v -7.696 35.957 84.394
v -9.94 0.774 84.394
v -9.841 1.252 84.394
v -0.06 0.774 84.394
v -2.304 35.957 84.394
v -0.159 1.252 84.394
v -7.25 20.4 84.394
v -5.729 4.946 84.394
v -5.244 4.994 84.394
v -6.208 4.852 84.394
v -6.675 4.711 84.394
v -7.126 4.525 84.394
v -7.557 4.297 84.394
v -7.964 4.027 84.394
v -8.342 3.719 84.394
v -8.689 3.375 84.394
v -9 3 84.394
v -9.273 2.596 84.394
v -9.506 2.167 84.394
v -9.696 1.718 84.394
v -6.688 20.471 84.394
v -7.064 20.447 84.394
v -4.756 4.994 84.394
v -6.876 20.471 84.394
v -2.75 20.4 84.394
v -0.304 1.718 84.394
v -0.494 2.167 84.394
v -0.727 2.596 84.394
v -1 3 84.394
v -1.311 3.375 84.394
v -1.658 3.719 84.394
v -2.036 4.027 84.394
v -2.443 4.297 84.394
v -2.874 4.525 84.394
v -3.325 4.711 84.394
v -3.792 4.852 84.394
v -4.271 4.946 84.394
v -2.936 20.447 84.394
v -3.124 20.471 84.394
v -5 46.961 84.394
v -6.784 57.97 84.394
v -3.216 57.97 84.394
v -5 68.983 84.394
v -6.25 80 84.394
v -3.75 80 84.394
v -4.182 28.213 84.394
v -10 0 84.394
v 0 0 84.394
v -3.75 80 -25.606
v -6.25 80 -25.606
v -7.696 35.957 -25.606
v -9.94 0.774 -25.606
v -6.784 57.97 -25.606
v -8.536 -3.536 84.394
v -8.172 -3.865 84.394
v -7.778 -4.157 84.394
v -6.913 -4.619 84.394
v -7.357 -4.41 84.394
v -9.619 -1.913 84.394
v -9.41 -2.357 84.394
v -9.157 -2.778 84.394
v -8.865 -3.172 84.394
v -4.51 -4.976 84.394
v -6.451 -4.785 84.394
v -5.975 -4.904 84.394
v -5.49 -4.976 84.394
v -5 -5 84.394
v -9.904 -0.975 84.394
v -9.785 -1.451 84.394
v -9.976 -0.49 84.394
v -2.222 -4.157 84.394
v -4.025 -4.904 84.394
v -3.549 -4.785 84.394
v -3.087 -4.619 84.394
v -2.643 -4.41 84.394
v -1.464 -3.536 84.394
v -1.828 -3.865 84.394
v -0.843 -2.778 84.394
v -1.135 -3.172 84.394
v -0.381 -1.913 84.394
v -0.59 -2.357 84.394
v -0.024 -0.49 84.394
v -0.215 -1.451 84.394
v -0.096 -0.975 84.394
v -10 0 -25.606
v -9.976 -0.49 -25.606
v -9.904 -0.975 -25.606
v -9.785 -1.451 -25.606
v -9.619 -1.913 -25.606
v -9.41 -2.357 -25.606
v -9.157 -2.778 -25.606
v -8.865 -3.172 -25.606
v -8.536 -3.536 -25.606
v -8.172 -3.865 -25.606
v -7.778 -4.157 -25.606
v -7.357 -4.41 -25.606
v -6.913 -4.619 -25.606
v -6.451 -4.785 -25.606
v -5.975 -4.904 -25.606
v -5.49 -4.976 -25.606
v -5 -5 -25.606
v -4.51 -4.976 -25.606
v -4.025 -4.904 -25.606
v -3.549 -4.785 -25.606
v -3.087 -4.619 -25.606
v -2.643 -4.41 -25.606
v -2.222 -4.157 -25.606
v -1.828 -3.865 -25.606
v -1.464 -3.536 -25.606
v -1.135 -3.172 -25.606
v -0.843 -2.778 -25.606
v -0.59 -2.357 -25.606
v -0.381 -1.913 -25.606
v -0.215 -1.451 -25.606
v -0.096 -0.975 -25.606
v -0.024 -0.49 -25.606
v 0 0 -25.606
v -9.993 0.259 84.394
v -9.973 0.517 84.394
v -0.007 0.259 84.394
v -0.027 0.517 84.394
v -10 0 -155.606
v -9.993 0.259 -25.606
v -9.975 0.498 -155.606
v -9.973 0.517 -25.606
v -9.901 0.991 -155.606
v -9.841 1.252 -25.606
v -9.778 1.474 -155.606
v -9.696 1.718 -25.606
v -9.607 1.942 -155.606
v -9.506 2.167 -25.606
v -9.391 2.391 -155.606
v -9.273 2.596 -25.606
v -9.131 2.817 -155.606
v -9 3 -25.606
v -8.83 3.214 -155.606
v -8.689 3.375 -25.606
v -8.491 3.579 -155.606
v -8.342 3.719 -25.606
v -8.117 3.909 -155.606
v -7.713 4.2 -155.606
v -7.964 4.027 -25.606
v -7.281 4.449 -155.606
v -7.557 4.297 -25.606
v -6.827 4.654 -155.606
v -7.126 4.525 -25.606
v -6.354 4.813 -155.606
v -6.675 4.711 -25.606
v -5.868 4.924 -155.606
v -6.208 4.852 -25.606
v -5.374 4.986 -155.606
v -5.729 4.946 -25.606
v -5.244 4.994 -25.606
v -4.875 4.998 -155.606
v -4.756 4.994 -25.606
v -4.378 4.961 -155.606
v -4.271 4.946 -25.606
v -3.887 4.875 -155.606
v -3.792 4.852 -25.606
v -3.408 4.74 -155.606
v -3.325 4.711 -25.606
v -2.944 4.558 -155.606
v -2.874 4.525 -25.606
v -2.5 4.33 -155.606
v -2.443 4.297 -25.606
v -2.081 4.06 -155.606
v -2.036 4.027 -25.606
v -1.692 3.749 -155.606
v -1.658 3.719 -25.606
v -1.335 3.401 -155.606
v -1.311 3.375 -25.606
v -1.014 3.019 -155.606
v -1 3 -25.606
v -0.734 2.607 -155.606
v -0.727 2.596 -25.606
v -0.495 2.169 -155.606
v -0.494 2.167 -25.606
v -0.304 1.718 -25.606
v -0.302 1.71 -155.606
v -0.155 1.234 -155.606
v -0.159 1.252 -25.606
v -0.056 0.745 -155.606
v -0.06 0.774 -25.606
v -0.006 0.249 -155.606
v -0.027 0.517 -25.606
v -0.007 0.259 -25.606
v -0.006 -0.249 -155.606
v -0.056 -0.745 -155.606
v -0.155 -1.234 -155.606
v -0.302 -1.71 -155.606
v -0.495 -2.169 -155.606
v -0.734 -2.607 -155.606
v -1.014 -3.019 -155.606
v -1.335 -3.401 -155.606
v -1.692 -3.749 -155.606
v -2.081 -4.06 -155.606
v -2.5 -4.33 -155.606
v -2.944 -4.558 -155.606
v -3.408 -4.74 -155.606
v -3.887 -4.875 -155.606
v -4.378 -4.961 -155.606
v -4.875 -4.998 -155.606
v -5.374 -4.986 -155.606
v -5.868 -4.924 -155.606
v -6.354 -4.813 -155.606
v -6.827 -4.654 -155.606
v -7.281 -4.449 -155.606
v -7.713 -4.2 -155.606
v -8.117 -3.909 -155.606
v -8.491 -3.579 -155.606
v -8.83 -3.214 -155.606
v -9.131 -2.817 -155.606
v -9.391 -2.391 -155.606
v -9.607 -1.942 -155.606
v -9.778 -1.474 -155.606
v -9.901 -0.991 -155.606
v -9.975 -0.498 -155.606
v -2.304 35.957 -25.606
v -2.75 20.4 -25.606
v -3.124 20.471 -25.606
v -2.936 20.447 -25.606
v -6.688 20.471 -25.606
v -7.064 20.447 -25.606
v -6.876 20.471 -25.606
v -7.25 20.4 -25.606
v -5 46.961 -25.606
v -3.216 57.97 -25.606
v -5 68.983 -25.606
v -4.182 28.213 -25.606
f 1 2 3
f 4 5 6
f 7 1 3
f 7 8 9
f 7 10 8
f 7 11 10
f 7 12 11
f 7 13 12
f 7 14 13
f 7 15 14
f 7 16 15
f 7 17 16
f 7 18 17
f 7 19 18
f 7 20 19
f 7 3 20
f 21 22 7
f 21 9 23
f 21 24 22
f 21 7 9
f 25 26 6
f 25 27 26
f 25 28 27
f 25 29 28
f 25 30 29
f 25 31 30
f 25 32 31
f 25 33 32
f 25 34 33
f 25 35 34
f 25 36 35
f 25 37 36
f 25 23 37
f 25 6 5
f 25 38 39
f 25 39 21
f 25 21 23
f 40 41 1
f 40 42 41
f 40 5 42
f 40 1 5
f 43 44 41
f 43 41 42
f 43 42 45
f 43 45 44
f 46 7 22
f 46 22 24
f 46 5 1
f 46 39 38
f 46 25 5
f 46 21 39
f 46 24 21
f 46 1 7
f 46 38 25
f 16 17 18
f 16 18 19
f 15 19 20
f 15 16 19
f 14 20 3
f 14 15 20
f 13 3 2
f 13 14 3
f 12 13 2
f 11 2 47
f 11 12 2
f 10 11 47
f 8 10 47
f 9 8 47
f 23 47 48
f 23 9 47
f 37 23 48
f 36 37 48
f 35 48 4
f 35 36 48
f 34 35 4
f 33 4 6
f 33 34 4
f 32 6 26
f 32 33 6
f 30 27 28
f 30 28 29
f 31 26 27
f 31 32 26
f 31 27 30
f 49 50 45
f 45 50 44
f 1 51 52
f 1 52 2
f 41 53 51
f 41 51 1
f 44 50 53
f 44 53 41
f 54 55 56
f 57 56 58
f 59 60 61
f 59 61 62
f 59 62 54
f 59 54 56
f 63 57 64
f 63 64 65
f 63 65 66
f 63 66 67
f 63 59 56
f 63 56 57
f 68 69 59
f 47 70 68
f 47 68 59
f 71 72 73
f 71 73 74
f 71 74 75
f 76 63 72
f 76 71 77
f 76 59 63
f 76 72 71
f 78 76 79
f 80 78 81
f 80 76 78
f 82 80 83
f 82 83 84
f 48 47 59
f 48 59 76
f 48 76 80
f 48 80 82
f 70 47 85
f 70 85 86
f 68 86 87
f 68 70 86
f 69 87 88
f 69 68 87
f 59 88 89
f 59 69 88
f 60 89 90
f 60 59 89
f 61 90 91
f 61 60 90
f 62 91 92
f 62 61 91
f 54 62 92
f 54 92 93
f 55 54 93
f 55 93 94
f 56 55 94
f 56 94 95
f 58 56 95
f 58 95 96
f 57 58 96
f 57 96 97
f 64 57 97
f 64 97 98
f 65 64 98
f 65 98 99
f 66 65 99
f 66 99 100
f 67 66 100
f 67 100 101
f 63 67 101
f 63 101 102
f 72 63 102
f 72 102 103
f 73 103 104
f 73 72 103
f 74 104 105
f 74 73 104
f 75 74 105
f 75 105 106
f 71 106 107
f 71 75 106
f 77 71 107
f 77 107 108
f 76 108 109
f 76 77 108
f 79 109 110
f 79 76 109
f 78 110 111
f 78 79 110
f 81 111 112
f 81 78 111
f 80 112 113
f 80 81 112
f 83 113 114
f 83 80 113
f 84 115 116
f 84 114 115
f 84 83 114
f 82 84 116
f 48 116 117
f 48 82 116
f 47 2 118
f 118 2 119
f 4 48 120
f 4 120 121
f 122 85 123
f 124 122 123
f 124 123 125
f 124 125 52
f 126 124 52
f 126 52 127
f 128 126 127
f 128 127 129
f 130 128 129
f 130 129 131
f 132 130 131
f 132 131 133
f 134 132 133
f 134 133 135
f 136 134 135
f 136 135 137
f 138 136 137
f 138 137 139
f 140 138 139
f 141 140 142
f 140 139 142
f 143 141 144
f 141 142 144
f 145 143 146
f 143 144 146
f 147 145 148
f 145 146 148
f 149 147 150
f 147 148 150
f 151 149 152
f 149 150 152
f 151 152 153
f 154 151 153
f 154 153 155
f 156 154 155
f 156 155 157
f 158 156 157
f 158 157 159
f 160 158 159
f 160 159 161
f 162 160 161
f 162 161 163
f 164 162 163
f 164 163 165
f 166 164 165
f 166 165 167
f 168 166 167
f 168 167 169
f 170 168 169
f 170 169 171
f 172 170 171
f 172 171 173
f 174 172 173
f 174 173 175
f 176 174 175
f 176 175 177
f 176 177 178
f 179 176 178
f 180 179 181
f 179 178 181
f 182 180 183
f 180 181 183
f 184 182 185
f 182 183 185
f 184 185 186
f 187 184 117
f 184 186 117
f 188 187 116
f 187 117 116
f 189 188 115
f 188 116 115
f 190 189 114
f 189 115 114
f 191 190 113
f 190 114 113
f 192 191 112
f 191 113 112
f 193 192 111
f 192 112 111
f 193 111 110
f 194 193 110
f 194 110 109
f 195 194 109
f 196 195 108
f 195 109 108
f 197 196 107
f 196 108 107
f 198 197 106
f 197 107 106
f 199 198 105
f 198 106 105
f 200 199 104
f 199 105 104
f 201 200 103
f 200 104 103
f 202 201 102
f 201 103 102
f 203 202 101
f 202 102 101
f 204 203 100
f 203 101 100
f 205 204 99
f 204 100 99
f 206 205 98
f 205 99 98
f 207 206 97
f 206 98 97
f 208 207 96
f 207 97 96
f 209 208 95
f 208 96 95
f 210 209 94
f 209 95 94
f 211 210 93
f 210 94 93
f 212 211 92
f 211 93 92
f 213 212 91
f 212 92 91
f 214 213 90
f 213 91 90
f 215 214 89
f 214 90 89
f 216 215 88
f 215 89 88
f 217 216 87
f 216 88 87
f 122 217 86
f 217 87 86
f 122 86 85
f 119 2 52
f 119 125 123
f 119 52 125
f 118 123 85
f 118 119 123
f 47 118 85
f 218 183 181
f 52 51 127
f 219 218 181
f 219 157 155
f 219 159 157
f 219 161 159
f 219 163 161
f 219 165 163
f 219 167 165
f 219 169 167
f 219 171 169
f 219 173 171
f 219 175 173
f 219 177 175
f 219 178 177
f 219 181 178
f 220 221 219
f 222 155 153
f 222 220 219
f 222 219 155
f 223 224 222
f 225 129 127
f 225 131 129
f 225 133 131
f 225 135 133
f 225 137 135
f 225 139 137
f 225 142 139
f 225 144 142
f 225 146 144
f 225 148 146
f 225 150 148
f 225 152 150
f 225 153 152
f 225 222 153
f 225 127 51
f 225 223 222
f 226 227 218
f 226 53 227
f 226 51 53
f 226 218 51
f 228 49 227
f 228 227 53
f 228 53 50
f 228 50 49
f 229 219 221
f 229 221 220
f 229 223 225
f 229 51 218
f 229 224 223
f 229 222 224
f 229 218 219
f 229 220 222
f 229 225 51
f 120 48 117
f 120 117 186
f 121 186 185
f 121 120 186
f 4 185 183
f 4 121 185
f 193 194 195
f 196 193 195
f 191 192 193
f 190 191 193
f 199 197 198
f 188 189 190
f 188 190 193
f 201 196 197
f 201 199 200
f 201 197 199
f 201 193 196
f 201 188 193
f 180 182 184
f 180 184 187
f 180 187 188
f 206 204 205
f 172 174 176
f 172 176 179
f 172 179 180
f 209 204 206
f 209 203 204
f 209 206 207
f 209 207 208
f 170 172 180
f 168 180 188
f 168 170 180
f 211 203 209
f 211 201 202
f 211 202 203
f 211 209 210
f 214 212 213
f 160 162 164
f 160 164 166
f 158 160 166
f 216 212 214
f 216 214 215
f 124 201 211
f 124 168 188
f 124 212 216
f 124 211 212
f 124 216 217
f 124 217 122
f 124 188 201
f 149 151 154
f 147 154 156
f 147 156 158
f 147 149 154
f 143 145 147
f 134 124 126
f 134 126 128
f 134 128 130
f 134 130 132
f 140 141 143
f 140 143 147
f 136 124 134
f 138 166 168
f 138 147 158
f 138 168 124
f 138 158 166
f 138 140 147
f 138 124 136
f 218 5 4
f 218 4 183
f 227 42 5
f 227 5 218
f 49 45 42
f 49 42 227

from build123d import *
from build123d.topology import SkipClean

# Parameters (mm, degrees)
SKETCH4_R           = 5
BOSS_EXTRUDE1_DEPTH = 130
BOSS_EXTRUDE2_START = 110
SKETCH5_R           = 5
BOSS_EXTRUDE2_DEPTH = 110


with BuildPart() as part:
    # Sketch1 → Loft1 section 0
    with BuildSketch(Plane(origin=(0, 0, 0), x_dir=(1, 0, 0), z_dir=(0, 1, 0))):
        with BuildLine():
            Line((0, 25.606060606), (-10, 25.606060606))
            Line((-10, 25.606060606), (-10, -84.393939394))
            Line((-10, -84.393939394), (0, -84.393939394))
            Line((0, -84.393939394), (0, 25.606060606))
        make_face()
    # Sketch2 → Loft1 section 1
    with BuildSketch(Plane(origin=(0, 40, 0), x_dir=(1, 0, 0), z_dir=(0, 1, 0))):
        with BuildLine():
            Line((-2.5, 25.606060606), (-2.5, -84.393939394))
            Line((-2.5, -84.393939394), (-7.5, -84.393939394))
            Line((-7.5, -84.393939394), (-7.5, 25.606060606))
            Line((-7.5, 25.606060606), (-2.5, 25.606060606))
        make_face()
    # Sketch3 → Loft1 section 2
    with BuildSketch(Plane(origin=(0, 80, 0), x_dir=(1, 0, 0), z_dir=(0, 1, 0))):
        with BuildLine():
            Line((-6.25, 25.606060606), (-3.75, 25.606060606))
            Line((-3.75, 25.606060606), (-3.75, -84.393939394))
            Line((-3.75, -84.393939394), (-6.25, -84.393939394))
            Line((-6.25, -84.393939394), (-6.25, 25.606060606))
        make_face()
    loft()

    # Sketch4 → Boss-Extrude1 (add)
    with BuildSketch(Plane(origin=(0, 0, -25.606060606), x_dir=(-1, 0, 0), z_dir=(0, 0, -1))):
        with Locations((5, 0)):
            Circle(SKETCH4_R)
    extrude(amount=BOSS_EXTRUDE1_DEPTH)

    # Sketch5 → Boss-Extrude2 (add)
    with SkipClean():  # the faces are left unmerged after this step: merging them gives an invalid solid
        with BuildSketch(Plane.XY.offset(-25.606060606).offset(BOSS_EXTRUDE2_START)):
            with Locations(Location((-5, 0, 0), (0, 0, 8.902401969))):
                Circle(SKETCH5_R)
        extrude(amount=-BOSS_EXTRUDE2_DEPTH)


solid = part.part
